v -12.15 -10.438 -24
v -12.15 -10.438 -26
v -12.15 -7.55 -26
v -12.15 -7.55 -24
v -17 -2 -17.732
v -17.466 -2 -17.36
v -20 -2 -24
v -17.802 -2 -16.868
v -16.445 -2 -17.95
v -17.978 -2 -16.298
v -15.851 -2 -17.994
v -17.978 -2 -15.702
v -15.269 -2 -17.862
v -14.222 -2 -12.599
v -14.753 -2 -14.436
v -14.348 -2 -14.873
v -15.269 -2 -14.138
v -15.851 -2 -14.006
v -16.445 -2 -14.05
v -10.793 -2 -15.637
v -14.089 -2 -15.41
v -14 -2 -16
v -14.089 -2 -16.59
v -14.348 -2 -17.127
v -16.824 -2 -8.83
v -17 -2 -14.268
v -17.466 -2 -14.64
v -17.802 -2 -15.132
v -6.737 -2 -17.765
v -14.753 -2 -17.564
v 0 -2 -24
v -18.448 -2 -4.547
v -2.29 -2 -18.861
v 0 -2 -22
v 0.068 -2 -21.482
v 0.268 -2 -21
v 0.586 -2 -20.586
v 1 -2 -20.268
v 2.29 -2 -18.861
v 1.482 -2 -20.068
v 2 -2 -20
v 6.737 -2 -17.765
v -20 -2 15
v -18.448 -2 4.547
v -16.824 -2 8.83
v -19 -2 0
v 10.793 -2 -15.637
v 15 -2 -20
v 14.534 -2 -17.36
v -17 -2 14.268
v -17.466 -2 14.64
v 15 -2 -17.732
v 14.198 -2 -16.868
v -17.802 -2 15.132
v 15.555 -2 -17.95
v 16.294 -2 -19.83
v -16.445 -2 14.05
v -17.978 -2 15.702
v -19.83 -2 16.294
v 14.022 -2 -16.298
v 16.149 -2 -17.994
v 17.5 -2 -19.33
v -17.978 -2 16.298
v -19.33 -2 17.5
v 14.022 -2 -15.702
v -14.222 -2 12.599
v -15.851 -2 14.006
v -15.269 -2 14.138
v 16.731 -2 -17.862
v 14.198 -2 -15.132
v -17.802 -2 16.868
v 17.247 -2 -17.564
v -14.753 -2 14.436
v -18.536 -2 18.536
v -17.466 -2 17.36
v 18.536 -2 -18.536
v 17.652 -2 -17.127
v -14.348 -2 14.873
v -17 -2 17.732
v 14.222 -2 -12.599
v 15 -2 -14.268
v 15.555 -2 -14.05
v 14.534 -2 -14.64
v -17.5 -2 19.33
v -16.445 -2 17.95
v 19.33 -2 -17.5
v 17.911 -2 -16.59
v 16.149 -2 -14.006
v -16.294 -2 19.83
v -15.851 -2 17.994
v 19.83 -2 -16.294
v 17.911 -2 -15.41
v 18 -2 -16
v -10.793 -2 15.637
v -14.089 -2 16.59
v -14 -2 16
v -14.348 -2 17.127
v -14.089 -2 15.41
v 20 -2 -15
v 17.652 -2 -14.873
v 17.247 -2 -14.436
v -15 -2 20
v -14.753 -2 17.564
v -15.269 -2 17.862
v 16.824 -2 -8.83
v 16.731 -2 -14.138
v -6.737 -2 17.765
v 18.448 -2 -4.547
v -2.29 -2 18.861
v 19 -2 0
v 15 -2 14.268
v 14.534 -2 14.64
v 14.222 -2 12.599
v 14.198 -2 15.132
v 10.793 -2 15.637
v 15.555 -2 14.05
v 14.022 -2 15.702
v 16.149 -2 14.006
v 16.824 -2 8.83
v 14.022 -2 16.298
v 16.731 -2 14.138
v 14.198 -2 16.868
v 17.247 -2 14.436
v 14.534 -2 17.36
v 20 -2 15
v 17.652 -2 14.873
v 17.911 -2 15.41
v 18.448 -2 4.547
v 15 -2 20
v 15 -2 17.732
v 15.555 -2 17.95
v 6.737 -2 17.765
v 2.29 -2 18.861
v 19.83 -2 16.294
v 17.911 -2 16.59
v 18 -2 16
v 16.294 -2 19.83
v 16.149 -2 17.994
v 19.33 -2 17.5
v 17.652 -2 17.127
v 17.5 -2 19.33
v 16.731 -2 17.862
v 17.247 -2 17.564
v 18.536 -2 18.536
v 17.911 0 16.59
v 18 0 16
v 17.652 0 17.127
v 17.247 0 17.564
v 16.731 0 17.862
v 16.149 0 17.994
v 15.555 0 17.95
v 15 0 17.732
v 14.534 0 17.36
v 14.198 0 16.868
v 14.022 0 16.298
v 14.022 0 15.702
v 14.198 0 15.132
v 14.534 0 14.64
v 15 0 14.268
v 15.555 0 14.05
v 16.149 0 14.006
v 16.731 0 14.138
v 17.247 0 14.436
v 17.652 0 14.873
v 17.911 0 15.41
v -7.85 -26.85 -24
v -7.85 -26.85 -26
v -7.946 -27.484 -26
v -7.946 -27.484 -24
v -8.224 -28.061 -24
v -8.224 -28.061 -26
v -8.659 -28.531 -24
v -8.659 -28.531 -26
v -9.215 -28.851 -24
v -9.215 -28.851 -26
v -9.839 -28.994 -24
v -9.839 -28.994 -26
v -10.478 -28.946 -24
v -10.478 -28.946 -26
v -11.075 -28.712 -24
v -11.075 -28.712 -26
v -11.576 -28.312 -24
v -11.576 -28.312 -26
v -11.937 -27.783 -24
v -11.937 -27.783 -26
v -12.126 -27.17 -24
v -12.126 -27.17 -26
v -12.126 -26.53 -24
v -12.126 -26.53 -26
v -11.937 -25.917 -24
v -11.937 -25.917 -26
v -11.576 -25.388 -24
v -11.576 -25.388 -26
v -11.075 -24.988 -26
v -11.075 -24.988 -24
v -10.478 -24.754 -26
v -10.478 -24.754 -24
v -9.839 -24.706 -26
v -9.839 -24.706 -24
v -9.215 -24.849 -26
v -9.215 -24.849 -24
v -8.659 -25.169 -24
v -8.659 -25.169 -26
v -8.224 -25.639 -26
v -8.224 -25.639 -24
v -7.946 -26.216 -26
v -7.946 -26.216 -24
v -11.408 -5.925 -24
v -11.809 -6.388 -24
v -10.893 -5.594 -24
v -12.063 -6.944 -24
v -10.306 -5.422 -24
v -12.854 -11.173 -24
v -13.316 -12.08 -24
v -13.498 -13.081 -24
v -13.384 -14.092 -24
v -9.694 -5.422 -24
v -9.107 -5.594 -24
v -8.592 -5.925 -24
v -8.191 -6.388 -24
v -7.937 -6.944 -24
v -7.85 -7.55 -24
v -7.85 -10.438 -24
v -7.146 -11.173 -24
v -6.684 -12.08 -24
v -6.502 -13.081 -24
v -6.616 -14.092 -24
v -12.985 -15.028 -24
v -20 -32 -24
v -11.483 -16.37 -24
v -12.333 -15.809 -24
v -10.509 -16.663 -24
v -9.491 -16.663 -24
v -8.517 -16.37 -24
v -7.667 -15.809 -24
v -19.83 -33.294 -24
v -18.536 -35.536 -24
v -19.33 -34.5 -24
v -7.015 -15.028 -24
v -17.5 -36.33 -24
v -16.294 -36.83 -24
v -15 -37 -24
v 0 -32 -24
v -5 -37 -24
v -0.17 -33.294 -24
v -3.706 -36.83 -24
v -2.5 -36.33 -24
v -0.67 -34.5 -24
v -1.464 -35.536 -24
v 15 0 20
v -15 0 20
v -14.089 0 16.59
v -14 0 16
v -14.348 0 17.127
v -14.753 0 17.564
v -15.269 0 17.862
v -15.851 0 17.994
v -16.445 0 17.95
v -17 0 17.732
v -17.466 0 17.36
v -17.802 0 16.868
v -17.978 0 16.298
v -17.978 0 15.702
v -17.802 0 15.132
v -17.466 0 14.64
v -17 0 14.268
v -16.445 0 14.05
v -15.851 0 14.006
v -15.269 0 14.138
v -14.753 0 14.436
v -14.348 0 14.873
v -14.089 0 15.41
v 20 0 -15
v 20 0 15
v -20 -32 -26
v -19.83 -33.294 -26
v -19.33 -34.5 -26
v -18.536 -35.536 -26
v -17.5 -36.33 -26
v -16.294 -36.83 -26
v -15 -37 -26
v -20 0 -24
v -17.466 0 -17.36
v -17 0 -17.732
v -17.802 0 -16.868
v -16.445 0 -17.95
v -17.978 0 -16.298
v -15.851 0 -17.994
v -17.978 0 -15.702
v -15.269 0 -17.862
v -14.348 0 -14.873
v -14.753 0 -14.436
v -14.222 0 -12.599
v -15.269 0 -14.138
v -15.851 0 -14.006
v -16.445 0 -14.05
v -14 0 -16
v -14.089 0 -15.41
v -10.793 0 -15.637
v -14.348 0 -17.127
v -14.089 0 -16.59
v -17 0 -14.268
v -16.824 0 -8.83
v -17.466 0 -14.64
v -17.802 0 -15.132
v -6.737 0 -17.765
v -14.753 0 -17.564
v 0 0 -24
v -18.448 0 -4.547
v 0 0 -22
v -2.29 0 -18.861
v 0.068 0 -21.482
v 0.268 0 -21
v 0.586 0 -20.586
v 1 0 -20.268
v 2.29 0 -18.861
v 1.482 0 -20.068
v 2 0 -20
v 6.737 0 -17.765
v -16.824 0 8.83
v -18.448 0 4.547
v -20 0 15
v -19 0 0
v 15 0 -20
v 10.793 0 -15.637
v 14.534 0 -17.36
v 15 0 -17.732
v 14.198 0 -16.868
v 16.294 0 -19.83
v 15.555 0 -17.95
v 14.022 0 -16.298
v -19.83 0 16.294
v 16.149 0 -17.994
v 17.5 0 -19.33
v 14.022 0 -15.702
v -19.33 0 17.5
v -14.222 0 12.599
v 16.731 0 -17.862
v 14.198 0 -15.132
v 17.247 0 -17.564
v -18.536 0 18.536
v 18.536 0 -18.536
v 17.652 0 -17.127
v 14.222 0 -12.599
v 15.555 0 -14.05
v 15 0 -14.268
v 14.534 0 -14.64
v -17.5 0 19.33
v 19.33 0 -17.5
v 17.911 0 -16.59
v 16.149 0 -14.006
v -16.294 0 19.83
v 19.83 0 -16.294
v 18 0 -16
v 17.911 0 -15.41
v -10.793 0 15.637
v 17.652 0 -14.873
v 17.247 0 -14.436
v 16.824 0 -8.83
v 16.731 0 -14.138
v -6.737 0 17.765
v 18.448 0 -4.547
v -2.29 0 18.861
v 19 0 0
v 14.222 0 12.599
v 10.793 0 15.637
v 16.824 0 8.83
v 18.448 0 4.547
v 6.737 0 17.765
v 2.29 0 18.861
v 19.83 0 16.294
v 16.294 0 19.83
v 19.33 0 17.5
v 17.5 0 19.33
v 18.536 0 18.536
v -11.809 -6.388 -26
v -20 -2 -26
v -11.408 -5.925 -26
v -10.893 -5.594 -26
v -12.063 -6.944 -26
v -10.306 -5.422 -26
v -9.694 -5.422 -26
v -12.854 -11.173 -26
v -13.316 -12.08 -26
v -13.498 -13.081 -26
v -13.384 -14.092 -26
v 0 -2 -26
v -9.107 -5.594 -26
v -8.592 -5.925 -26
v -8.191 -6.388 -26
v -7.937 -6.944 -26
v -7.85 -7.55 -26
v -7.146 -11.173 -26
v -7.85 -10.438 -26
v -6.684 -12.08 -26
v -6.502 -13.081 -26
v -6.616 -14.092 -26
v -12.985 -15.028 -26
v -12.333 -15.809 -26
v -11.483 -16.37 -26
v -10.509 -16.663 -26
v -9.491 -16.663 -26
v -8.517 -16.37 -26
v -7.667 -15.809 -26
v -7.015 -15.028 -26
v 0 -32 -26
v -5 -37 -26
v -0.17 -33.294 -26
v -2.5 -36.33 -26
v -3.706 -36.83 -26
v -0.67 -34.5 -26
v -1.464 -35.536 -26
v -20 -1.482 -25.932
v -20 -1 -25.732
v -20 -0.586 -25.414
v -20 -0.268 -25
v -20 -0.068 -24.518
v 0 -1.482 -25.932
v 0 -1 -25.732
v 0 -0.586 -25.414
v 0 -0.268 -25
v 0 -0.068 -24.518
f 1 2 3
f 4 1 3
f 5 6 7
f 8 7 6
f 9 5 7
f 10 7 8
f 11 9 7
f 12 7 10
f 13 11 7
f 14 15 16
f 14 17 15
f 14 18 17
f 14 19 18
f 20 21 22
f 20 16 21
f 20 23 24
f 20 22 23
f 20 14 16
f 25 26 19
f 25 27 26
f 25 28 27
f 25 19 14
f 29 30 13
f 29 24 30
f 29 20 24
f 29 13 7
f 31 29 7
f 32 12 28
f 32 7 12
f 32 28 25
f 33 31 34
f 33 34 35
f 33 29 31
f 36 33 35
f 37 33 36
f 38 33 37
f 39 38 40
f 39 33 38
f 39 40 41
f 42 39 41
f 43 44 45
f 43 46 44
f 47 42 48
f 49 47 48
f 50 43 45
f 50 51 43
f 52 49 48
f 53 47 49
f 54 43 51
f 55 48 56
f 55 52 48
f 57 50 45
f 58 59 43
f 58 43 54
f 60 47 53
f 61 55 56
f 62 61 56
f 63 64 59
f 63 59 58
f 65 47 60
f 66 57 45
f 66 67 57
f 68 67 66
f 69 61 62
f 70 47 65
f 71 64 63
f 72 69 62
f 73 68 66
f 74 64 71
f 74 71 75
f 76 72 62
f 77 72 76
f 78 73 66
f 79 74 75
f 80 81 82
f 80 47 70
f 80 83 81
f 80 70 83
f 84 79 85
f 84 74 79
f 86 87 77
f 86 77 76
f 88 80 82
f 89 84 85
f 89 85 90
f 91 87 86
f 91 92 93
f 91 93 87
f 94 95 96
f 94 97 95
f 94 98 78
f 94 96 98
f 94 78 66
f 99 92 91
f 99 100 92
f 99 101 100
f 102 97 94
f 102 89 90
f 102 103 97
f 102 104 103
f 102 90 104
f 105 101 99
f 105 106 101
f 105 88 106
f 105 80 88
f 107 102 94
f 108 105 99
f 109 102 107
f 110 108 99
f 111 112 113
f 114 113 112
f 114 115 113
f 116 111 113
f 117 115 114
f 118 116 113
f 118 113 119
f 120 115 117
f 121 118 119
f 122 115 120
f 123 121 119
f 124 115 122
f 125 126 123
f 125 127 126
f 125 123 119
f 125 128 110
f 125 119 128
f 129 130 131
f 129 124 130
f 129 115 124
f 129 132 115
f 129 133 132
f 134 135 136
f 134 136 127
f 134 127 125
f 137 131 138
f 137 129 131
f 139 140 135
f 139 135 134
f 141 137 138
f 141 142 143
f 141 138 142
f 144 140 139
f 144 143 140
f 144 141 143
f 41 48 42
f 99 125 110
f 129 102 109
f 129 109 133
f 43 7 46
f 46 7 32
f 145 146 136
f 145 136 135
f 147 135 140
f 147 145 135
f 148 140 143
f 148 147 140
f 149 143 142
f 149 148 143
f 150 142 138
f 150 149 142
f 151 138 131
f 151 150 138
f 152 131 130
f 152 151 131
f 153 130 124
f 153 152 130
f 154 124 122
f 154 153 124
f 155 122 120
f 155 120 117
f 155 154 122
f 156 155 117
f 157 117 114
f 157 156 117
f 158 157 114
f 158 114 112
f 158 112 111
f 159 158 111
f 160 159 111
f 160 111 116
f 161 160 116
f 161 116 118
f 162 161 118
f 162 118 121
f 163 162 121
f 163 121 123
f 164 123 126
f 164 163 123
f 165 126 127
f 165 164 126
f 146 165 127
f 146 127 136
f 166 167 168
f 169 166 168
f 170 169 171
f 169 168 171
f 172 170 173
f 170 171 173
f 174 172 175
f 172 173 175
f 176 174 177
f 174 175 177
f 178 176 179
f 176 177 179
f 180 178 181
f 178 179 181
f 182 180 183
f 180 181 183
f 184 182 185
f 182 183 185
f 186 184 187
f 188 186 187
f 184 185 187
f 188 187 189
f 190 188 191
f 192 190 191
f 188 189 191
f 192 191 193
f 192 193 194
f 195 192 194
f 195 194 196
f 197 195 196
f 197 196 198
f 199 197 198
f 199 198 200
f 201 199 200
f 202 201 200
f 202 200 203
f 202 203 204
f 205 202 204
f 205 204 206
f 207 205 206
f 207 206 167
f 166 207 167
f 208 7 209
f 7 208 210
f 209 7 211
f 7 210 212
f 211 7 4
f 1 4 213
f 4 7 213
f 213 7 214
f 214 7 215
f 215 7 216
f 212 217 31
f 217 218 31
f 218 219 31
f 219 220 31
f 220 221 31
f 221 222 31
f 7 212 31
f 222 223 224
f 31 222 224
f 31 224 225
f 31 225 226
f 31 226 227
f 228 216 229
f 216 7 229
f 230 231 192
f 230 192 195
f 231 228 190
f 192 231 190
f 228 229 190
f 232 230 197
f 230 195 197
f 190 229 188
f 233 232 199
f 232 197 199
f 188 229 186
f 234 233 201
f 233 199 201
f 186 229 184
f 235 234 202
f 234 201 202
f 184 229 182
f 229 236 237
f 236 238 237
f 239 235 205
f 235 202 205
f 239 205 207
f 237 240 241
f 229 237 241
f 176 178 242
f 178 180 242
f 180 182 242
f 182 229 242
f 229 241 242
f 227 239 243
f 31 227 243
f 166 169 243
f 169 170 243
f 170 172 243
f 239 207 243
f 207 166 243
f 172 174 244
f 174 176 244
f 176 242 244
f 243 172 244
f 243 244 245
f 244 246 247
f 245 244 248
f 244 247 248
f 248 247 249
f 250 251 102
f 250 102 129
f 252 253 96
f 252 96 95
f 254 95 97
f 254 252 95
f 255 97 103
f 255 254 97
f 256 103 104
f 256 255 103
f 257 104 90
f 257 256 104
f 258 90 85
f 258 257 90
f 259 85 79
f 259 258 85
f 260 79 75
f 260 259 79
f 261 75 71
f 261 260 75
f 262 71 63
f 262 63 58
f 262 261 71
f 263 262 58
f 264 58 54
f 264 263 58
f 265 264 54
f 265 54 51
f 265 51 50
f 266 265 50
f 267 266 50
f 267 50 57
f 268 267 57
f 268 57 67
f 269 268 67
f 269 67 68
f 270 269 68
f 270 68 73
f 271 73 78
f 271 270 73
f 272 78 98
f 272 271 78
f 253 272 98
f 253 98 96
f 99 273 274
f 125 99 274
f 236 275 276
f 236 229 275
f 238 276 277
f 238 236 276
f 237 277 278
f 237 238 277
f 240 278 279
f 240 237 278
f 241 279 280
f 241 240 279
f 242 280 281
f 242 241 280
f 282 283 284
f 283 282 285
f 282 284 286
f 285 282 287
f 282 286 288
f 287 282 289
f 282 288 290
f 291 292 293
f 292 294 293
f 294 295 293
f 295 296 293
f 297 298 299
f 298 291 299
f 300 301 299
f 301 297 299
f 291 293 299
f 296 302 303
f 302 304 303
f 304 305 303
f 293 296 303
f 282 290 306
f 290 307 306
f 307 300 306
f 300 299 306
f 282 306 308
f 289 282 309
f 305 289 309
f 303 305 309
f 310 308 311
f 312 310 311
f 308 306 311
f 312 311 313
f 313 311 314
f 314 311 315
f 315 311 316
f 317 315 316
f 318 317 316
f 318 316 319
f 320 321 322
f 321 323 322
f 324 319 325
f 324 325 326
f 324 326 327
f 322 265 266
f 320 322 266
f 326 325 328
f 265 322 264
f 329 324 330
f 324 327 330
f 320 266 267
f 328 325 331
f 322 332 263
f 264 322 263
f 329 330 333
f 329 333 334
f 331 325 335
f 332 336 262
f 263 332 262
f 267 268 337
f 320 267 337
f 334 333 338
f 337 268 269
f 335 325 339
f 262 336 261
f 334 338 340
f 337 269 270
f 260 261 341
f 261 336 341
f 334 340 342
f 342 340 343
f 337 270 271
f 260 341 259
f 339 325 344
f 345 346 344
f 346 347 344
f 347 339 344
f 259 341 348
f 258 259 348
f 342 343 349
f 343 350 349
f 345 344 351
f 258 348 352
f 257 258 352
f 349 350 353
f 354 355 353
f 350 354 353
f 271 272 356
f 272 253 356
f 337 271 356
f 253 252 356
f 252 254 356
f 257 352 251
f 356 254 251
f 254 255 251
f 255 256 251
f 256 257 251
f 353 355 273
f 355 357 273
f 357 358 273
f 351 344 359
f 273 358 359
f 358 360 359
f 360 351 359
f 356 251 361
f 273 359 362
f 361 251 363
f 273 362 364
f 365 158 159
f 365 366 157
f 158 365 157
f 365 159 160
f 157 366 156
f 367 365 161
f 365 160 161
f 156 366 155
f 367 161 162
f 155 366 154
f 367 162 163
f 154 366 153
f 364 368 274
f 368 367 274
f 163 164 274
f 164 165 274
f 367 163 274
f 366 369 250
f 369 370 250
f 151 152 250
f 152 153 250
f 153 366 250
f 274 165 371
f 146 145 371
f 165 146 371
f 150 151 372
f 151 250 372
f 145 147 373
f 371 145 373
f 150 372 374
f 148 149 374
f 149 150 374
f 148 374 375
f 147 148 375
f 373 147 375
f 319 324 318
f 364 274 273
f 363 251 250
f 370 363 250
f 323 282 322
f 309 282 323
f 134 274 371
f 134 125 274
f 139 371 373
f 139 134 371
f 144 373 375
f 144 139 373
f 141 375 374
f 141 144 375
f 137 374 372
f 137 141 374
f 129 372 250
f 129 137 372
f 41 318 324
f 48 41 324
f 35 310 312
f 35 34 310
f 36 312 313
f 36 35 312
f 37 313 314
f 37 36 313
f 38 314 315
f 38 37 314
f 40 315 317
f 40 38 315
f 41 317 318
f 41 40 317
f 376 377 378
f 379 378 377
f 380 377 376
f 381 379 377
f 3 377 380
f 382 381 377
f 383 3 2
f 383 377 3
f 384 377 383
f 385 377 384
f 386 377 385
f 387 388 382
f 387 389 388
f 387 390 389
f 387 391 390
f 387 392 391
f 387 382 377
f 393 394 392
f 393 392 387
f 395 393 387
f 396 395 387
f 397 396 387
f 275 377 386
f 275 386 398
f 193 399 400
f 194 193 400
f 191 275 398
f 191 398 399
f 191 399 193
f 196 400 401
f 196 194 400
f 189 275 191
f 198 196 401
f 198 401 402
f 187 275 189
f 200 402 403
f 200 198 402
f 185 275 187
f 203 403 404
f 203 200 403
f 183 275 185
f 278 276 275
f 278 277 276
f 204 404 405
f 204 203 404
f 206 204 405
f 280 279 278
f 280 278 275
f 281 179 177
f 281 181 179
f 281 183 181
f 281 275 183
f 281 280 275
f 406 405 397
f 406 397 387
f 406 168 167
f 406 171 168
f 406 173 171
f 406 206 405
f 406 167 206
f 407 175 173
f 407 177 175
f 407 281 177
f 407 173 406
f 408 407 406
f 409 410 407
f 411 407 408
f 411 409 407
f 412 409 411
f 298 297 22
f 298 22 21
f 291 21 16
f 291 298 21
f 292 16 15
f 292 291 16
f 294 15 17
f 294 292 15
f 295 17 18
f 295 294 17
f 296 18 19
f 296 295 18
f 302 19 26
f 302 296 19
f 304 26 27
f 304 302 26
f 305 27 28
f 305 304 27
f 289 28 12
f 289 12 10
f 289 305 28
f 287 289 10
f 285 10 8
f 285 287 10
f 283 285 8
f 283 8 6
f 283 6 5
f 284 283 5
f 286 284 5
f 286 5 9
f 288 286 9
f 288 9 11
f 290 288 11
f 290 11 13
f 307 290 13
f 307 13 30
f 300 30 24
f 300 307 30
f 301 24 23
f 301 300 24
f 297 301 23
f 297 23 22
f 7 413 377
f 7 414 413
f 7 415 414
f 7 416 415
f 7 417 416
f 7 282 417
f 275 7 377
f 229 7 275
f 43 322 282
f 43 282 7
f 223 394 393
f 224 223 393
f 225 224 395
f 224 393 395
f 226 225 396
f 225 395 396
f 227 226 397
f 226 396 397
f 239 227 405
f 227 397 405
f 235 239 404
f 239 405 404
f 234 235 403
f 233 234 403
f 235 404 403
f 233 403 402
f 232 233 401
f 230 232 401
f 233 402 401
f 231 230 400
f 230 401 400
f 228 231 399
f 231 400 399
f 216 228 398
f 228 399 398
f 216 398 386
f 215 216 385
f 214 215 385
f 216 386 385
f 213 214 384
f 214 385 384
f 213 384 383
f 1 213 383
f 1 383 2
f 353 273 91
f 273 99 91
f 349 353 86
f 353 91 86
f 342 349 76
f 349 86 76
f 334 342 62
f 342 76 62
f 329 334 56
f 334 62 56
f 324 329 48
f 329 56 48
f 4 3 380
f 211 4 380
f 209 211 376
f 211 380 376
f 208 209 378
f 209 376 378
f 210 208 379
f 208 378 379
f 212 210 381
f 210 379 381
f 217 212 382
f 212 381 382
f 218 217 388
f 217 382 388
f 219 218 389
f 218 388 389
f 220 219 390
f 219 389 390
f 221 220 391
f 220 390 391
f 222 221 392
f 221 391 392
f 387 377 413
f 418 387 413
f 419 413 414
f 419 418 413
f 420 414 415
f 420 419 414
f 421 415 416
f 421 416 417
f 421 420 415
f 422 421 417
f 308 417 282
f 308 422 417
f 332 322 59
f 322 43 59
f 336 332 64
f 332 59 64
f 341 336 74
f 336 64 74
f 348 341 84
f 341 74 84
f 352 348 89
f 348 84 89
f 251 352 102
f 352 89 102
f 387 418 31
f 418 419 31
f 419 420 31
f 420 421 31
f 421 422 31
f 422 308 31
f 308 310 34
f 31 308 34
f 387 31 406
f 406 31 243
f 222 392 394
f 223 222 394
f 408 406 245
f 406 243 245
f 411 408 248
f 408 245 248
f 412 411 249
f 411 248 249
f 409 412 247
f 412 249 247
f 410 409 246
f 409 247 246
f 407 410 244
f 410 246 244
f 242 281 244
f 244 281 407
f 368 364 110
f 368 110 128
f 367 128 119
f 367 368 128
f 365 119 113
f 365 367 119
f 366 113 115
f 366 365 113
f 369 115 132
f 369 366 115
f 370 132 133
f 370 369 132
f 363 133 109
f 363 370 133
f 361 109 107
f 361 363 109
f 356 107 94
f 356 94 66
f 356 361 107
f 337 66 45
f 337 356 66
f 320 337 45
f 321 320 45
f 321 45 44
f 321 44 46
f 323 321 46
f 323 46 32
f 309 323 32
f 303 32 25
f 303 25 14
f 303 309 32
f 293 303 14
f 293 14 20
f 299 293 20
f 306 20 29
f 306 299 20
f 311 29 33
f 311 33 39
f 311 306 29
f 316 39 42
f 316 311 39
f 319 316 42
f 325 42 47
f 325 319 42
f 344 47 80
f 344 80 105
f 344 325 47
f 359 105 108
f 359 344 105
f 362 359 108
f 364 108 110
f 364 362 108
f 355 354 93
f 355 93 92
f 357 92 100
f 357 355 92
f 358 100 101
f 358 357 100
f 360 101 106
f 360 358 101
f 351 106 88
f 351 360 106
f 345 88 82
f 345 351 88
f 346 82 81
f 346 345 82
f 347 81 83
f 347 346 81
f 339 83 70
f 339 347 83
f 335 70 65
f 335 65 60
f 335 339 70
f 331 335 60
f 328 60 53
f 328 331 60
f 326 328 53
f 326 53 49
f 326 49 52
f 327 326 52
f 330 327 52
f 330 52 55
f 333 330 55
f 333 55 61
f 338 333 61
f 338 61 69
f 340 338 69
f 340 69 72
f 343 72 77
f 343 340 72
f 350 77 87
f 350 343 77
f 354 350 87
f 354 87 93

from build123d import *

# Parameters (mm, degrees)
F0_W     = 40
F0_H     = 40
F0_R     = 2
F0_R_2   = 19
F1_DEPTH = 2
F2_W     = 20
F2_H     = 2
F3_DEPTH = 6
F4_W     = 20
F4_H     = 37
F5_DEPTH = 2
F6_R     = 5
F7_R     = 2.15
F8_DEPTH = 3
F9_R     = 2


with BuildPart() as f1:
    # F0 (on Front) → F1 (new body)
    with BuildSketch(Plane.XZ):
        Rectangle(F0_W, F0_H)
        with Locations((-16, -16)):
            Circle(F0_R, mode=Mode.SUBTRACT)
        with Locations((16, -16)):
            Circle(F0_R, mode=Mode.SUBTRACT)
        with Locations((-16, 16)):
            Circle(F0_R, mode=Mode.SUBTRACT)
        Circle(F0_R_2, mode=Mode.SUBTRACT)
        with Locations((16, 16)):
            Circle(F0_R, mode=Mode.SUBTRACT)
    extrude(amount=F1_DEPTH)

    # F2 (on face) → F3 (join)
    with BuildSketch(Plane(origin=(0, 0, -20), x_dir=(1, 0, 0), z_dir=(0, 0, -1))):
        with Locations((-10, 1)):
            Rectangle(F2_W, F2_H)
    extrude(amount=F3_DEPTH)

    # F4 (on face) → F5 (join)
    with BuildSketch(Plane(origin=(0, 0, -26), x_dir=(1, 0, 0), z_dir=(0, 0, -1))):
        with Locations((-10, 18.5)):
            Rectangle(F4_W, F4_H)
    extrude(amount=-F5_DEPTH)

    # F6
    f6_edges = [f1.edges().sort_by_distance(p)[0] for p in [
        (20, -1, -20),
        (20, -1, 20),
        (-20, -1, 20),
        (-20, -37, -25),
        (0, -37, -25),
    ]]
    fillet(f6_edges, radius=F6_R)

    # F7 (on face) → F8 (cut)
    with BuildSketch(Plane(origin=(0, 0, -26), x_dir=(1, 0, 0), z_dir=(0, 0, -1))):
        with Locations((-10, 26.85)):
            Circle(F7_R)
        with BuildLine():
            Line((-12.15, 10.438207), (-12.15, 7.55))
            ThreePointArc((-12.15, 7.55), (-10, 5.4), (-7.85, 7.55))
            Line((-7.85, 7.55), (-7.85, 10.438207))
            ThreePointArc((-7.85, 10.438207), (-10, 16.7), (-12.15, 10.438207))
        make_face()
    extrude(amount=-F8_DEPTH, mode=Mode.SUBTRACT)

    # F9
    f9_edges = [f1.edges().sort_by_distance(p)[0] for p in [
        (0, -1, -20),
        (-10, 0, -26),
    ]]
    fillet(f9_edges, radius=F9_R)


solid = f1.part
